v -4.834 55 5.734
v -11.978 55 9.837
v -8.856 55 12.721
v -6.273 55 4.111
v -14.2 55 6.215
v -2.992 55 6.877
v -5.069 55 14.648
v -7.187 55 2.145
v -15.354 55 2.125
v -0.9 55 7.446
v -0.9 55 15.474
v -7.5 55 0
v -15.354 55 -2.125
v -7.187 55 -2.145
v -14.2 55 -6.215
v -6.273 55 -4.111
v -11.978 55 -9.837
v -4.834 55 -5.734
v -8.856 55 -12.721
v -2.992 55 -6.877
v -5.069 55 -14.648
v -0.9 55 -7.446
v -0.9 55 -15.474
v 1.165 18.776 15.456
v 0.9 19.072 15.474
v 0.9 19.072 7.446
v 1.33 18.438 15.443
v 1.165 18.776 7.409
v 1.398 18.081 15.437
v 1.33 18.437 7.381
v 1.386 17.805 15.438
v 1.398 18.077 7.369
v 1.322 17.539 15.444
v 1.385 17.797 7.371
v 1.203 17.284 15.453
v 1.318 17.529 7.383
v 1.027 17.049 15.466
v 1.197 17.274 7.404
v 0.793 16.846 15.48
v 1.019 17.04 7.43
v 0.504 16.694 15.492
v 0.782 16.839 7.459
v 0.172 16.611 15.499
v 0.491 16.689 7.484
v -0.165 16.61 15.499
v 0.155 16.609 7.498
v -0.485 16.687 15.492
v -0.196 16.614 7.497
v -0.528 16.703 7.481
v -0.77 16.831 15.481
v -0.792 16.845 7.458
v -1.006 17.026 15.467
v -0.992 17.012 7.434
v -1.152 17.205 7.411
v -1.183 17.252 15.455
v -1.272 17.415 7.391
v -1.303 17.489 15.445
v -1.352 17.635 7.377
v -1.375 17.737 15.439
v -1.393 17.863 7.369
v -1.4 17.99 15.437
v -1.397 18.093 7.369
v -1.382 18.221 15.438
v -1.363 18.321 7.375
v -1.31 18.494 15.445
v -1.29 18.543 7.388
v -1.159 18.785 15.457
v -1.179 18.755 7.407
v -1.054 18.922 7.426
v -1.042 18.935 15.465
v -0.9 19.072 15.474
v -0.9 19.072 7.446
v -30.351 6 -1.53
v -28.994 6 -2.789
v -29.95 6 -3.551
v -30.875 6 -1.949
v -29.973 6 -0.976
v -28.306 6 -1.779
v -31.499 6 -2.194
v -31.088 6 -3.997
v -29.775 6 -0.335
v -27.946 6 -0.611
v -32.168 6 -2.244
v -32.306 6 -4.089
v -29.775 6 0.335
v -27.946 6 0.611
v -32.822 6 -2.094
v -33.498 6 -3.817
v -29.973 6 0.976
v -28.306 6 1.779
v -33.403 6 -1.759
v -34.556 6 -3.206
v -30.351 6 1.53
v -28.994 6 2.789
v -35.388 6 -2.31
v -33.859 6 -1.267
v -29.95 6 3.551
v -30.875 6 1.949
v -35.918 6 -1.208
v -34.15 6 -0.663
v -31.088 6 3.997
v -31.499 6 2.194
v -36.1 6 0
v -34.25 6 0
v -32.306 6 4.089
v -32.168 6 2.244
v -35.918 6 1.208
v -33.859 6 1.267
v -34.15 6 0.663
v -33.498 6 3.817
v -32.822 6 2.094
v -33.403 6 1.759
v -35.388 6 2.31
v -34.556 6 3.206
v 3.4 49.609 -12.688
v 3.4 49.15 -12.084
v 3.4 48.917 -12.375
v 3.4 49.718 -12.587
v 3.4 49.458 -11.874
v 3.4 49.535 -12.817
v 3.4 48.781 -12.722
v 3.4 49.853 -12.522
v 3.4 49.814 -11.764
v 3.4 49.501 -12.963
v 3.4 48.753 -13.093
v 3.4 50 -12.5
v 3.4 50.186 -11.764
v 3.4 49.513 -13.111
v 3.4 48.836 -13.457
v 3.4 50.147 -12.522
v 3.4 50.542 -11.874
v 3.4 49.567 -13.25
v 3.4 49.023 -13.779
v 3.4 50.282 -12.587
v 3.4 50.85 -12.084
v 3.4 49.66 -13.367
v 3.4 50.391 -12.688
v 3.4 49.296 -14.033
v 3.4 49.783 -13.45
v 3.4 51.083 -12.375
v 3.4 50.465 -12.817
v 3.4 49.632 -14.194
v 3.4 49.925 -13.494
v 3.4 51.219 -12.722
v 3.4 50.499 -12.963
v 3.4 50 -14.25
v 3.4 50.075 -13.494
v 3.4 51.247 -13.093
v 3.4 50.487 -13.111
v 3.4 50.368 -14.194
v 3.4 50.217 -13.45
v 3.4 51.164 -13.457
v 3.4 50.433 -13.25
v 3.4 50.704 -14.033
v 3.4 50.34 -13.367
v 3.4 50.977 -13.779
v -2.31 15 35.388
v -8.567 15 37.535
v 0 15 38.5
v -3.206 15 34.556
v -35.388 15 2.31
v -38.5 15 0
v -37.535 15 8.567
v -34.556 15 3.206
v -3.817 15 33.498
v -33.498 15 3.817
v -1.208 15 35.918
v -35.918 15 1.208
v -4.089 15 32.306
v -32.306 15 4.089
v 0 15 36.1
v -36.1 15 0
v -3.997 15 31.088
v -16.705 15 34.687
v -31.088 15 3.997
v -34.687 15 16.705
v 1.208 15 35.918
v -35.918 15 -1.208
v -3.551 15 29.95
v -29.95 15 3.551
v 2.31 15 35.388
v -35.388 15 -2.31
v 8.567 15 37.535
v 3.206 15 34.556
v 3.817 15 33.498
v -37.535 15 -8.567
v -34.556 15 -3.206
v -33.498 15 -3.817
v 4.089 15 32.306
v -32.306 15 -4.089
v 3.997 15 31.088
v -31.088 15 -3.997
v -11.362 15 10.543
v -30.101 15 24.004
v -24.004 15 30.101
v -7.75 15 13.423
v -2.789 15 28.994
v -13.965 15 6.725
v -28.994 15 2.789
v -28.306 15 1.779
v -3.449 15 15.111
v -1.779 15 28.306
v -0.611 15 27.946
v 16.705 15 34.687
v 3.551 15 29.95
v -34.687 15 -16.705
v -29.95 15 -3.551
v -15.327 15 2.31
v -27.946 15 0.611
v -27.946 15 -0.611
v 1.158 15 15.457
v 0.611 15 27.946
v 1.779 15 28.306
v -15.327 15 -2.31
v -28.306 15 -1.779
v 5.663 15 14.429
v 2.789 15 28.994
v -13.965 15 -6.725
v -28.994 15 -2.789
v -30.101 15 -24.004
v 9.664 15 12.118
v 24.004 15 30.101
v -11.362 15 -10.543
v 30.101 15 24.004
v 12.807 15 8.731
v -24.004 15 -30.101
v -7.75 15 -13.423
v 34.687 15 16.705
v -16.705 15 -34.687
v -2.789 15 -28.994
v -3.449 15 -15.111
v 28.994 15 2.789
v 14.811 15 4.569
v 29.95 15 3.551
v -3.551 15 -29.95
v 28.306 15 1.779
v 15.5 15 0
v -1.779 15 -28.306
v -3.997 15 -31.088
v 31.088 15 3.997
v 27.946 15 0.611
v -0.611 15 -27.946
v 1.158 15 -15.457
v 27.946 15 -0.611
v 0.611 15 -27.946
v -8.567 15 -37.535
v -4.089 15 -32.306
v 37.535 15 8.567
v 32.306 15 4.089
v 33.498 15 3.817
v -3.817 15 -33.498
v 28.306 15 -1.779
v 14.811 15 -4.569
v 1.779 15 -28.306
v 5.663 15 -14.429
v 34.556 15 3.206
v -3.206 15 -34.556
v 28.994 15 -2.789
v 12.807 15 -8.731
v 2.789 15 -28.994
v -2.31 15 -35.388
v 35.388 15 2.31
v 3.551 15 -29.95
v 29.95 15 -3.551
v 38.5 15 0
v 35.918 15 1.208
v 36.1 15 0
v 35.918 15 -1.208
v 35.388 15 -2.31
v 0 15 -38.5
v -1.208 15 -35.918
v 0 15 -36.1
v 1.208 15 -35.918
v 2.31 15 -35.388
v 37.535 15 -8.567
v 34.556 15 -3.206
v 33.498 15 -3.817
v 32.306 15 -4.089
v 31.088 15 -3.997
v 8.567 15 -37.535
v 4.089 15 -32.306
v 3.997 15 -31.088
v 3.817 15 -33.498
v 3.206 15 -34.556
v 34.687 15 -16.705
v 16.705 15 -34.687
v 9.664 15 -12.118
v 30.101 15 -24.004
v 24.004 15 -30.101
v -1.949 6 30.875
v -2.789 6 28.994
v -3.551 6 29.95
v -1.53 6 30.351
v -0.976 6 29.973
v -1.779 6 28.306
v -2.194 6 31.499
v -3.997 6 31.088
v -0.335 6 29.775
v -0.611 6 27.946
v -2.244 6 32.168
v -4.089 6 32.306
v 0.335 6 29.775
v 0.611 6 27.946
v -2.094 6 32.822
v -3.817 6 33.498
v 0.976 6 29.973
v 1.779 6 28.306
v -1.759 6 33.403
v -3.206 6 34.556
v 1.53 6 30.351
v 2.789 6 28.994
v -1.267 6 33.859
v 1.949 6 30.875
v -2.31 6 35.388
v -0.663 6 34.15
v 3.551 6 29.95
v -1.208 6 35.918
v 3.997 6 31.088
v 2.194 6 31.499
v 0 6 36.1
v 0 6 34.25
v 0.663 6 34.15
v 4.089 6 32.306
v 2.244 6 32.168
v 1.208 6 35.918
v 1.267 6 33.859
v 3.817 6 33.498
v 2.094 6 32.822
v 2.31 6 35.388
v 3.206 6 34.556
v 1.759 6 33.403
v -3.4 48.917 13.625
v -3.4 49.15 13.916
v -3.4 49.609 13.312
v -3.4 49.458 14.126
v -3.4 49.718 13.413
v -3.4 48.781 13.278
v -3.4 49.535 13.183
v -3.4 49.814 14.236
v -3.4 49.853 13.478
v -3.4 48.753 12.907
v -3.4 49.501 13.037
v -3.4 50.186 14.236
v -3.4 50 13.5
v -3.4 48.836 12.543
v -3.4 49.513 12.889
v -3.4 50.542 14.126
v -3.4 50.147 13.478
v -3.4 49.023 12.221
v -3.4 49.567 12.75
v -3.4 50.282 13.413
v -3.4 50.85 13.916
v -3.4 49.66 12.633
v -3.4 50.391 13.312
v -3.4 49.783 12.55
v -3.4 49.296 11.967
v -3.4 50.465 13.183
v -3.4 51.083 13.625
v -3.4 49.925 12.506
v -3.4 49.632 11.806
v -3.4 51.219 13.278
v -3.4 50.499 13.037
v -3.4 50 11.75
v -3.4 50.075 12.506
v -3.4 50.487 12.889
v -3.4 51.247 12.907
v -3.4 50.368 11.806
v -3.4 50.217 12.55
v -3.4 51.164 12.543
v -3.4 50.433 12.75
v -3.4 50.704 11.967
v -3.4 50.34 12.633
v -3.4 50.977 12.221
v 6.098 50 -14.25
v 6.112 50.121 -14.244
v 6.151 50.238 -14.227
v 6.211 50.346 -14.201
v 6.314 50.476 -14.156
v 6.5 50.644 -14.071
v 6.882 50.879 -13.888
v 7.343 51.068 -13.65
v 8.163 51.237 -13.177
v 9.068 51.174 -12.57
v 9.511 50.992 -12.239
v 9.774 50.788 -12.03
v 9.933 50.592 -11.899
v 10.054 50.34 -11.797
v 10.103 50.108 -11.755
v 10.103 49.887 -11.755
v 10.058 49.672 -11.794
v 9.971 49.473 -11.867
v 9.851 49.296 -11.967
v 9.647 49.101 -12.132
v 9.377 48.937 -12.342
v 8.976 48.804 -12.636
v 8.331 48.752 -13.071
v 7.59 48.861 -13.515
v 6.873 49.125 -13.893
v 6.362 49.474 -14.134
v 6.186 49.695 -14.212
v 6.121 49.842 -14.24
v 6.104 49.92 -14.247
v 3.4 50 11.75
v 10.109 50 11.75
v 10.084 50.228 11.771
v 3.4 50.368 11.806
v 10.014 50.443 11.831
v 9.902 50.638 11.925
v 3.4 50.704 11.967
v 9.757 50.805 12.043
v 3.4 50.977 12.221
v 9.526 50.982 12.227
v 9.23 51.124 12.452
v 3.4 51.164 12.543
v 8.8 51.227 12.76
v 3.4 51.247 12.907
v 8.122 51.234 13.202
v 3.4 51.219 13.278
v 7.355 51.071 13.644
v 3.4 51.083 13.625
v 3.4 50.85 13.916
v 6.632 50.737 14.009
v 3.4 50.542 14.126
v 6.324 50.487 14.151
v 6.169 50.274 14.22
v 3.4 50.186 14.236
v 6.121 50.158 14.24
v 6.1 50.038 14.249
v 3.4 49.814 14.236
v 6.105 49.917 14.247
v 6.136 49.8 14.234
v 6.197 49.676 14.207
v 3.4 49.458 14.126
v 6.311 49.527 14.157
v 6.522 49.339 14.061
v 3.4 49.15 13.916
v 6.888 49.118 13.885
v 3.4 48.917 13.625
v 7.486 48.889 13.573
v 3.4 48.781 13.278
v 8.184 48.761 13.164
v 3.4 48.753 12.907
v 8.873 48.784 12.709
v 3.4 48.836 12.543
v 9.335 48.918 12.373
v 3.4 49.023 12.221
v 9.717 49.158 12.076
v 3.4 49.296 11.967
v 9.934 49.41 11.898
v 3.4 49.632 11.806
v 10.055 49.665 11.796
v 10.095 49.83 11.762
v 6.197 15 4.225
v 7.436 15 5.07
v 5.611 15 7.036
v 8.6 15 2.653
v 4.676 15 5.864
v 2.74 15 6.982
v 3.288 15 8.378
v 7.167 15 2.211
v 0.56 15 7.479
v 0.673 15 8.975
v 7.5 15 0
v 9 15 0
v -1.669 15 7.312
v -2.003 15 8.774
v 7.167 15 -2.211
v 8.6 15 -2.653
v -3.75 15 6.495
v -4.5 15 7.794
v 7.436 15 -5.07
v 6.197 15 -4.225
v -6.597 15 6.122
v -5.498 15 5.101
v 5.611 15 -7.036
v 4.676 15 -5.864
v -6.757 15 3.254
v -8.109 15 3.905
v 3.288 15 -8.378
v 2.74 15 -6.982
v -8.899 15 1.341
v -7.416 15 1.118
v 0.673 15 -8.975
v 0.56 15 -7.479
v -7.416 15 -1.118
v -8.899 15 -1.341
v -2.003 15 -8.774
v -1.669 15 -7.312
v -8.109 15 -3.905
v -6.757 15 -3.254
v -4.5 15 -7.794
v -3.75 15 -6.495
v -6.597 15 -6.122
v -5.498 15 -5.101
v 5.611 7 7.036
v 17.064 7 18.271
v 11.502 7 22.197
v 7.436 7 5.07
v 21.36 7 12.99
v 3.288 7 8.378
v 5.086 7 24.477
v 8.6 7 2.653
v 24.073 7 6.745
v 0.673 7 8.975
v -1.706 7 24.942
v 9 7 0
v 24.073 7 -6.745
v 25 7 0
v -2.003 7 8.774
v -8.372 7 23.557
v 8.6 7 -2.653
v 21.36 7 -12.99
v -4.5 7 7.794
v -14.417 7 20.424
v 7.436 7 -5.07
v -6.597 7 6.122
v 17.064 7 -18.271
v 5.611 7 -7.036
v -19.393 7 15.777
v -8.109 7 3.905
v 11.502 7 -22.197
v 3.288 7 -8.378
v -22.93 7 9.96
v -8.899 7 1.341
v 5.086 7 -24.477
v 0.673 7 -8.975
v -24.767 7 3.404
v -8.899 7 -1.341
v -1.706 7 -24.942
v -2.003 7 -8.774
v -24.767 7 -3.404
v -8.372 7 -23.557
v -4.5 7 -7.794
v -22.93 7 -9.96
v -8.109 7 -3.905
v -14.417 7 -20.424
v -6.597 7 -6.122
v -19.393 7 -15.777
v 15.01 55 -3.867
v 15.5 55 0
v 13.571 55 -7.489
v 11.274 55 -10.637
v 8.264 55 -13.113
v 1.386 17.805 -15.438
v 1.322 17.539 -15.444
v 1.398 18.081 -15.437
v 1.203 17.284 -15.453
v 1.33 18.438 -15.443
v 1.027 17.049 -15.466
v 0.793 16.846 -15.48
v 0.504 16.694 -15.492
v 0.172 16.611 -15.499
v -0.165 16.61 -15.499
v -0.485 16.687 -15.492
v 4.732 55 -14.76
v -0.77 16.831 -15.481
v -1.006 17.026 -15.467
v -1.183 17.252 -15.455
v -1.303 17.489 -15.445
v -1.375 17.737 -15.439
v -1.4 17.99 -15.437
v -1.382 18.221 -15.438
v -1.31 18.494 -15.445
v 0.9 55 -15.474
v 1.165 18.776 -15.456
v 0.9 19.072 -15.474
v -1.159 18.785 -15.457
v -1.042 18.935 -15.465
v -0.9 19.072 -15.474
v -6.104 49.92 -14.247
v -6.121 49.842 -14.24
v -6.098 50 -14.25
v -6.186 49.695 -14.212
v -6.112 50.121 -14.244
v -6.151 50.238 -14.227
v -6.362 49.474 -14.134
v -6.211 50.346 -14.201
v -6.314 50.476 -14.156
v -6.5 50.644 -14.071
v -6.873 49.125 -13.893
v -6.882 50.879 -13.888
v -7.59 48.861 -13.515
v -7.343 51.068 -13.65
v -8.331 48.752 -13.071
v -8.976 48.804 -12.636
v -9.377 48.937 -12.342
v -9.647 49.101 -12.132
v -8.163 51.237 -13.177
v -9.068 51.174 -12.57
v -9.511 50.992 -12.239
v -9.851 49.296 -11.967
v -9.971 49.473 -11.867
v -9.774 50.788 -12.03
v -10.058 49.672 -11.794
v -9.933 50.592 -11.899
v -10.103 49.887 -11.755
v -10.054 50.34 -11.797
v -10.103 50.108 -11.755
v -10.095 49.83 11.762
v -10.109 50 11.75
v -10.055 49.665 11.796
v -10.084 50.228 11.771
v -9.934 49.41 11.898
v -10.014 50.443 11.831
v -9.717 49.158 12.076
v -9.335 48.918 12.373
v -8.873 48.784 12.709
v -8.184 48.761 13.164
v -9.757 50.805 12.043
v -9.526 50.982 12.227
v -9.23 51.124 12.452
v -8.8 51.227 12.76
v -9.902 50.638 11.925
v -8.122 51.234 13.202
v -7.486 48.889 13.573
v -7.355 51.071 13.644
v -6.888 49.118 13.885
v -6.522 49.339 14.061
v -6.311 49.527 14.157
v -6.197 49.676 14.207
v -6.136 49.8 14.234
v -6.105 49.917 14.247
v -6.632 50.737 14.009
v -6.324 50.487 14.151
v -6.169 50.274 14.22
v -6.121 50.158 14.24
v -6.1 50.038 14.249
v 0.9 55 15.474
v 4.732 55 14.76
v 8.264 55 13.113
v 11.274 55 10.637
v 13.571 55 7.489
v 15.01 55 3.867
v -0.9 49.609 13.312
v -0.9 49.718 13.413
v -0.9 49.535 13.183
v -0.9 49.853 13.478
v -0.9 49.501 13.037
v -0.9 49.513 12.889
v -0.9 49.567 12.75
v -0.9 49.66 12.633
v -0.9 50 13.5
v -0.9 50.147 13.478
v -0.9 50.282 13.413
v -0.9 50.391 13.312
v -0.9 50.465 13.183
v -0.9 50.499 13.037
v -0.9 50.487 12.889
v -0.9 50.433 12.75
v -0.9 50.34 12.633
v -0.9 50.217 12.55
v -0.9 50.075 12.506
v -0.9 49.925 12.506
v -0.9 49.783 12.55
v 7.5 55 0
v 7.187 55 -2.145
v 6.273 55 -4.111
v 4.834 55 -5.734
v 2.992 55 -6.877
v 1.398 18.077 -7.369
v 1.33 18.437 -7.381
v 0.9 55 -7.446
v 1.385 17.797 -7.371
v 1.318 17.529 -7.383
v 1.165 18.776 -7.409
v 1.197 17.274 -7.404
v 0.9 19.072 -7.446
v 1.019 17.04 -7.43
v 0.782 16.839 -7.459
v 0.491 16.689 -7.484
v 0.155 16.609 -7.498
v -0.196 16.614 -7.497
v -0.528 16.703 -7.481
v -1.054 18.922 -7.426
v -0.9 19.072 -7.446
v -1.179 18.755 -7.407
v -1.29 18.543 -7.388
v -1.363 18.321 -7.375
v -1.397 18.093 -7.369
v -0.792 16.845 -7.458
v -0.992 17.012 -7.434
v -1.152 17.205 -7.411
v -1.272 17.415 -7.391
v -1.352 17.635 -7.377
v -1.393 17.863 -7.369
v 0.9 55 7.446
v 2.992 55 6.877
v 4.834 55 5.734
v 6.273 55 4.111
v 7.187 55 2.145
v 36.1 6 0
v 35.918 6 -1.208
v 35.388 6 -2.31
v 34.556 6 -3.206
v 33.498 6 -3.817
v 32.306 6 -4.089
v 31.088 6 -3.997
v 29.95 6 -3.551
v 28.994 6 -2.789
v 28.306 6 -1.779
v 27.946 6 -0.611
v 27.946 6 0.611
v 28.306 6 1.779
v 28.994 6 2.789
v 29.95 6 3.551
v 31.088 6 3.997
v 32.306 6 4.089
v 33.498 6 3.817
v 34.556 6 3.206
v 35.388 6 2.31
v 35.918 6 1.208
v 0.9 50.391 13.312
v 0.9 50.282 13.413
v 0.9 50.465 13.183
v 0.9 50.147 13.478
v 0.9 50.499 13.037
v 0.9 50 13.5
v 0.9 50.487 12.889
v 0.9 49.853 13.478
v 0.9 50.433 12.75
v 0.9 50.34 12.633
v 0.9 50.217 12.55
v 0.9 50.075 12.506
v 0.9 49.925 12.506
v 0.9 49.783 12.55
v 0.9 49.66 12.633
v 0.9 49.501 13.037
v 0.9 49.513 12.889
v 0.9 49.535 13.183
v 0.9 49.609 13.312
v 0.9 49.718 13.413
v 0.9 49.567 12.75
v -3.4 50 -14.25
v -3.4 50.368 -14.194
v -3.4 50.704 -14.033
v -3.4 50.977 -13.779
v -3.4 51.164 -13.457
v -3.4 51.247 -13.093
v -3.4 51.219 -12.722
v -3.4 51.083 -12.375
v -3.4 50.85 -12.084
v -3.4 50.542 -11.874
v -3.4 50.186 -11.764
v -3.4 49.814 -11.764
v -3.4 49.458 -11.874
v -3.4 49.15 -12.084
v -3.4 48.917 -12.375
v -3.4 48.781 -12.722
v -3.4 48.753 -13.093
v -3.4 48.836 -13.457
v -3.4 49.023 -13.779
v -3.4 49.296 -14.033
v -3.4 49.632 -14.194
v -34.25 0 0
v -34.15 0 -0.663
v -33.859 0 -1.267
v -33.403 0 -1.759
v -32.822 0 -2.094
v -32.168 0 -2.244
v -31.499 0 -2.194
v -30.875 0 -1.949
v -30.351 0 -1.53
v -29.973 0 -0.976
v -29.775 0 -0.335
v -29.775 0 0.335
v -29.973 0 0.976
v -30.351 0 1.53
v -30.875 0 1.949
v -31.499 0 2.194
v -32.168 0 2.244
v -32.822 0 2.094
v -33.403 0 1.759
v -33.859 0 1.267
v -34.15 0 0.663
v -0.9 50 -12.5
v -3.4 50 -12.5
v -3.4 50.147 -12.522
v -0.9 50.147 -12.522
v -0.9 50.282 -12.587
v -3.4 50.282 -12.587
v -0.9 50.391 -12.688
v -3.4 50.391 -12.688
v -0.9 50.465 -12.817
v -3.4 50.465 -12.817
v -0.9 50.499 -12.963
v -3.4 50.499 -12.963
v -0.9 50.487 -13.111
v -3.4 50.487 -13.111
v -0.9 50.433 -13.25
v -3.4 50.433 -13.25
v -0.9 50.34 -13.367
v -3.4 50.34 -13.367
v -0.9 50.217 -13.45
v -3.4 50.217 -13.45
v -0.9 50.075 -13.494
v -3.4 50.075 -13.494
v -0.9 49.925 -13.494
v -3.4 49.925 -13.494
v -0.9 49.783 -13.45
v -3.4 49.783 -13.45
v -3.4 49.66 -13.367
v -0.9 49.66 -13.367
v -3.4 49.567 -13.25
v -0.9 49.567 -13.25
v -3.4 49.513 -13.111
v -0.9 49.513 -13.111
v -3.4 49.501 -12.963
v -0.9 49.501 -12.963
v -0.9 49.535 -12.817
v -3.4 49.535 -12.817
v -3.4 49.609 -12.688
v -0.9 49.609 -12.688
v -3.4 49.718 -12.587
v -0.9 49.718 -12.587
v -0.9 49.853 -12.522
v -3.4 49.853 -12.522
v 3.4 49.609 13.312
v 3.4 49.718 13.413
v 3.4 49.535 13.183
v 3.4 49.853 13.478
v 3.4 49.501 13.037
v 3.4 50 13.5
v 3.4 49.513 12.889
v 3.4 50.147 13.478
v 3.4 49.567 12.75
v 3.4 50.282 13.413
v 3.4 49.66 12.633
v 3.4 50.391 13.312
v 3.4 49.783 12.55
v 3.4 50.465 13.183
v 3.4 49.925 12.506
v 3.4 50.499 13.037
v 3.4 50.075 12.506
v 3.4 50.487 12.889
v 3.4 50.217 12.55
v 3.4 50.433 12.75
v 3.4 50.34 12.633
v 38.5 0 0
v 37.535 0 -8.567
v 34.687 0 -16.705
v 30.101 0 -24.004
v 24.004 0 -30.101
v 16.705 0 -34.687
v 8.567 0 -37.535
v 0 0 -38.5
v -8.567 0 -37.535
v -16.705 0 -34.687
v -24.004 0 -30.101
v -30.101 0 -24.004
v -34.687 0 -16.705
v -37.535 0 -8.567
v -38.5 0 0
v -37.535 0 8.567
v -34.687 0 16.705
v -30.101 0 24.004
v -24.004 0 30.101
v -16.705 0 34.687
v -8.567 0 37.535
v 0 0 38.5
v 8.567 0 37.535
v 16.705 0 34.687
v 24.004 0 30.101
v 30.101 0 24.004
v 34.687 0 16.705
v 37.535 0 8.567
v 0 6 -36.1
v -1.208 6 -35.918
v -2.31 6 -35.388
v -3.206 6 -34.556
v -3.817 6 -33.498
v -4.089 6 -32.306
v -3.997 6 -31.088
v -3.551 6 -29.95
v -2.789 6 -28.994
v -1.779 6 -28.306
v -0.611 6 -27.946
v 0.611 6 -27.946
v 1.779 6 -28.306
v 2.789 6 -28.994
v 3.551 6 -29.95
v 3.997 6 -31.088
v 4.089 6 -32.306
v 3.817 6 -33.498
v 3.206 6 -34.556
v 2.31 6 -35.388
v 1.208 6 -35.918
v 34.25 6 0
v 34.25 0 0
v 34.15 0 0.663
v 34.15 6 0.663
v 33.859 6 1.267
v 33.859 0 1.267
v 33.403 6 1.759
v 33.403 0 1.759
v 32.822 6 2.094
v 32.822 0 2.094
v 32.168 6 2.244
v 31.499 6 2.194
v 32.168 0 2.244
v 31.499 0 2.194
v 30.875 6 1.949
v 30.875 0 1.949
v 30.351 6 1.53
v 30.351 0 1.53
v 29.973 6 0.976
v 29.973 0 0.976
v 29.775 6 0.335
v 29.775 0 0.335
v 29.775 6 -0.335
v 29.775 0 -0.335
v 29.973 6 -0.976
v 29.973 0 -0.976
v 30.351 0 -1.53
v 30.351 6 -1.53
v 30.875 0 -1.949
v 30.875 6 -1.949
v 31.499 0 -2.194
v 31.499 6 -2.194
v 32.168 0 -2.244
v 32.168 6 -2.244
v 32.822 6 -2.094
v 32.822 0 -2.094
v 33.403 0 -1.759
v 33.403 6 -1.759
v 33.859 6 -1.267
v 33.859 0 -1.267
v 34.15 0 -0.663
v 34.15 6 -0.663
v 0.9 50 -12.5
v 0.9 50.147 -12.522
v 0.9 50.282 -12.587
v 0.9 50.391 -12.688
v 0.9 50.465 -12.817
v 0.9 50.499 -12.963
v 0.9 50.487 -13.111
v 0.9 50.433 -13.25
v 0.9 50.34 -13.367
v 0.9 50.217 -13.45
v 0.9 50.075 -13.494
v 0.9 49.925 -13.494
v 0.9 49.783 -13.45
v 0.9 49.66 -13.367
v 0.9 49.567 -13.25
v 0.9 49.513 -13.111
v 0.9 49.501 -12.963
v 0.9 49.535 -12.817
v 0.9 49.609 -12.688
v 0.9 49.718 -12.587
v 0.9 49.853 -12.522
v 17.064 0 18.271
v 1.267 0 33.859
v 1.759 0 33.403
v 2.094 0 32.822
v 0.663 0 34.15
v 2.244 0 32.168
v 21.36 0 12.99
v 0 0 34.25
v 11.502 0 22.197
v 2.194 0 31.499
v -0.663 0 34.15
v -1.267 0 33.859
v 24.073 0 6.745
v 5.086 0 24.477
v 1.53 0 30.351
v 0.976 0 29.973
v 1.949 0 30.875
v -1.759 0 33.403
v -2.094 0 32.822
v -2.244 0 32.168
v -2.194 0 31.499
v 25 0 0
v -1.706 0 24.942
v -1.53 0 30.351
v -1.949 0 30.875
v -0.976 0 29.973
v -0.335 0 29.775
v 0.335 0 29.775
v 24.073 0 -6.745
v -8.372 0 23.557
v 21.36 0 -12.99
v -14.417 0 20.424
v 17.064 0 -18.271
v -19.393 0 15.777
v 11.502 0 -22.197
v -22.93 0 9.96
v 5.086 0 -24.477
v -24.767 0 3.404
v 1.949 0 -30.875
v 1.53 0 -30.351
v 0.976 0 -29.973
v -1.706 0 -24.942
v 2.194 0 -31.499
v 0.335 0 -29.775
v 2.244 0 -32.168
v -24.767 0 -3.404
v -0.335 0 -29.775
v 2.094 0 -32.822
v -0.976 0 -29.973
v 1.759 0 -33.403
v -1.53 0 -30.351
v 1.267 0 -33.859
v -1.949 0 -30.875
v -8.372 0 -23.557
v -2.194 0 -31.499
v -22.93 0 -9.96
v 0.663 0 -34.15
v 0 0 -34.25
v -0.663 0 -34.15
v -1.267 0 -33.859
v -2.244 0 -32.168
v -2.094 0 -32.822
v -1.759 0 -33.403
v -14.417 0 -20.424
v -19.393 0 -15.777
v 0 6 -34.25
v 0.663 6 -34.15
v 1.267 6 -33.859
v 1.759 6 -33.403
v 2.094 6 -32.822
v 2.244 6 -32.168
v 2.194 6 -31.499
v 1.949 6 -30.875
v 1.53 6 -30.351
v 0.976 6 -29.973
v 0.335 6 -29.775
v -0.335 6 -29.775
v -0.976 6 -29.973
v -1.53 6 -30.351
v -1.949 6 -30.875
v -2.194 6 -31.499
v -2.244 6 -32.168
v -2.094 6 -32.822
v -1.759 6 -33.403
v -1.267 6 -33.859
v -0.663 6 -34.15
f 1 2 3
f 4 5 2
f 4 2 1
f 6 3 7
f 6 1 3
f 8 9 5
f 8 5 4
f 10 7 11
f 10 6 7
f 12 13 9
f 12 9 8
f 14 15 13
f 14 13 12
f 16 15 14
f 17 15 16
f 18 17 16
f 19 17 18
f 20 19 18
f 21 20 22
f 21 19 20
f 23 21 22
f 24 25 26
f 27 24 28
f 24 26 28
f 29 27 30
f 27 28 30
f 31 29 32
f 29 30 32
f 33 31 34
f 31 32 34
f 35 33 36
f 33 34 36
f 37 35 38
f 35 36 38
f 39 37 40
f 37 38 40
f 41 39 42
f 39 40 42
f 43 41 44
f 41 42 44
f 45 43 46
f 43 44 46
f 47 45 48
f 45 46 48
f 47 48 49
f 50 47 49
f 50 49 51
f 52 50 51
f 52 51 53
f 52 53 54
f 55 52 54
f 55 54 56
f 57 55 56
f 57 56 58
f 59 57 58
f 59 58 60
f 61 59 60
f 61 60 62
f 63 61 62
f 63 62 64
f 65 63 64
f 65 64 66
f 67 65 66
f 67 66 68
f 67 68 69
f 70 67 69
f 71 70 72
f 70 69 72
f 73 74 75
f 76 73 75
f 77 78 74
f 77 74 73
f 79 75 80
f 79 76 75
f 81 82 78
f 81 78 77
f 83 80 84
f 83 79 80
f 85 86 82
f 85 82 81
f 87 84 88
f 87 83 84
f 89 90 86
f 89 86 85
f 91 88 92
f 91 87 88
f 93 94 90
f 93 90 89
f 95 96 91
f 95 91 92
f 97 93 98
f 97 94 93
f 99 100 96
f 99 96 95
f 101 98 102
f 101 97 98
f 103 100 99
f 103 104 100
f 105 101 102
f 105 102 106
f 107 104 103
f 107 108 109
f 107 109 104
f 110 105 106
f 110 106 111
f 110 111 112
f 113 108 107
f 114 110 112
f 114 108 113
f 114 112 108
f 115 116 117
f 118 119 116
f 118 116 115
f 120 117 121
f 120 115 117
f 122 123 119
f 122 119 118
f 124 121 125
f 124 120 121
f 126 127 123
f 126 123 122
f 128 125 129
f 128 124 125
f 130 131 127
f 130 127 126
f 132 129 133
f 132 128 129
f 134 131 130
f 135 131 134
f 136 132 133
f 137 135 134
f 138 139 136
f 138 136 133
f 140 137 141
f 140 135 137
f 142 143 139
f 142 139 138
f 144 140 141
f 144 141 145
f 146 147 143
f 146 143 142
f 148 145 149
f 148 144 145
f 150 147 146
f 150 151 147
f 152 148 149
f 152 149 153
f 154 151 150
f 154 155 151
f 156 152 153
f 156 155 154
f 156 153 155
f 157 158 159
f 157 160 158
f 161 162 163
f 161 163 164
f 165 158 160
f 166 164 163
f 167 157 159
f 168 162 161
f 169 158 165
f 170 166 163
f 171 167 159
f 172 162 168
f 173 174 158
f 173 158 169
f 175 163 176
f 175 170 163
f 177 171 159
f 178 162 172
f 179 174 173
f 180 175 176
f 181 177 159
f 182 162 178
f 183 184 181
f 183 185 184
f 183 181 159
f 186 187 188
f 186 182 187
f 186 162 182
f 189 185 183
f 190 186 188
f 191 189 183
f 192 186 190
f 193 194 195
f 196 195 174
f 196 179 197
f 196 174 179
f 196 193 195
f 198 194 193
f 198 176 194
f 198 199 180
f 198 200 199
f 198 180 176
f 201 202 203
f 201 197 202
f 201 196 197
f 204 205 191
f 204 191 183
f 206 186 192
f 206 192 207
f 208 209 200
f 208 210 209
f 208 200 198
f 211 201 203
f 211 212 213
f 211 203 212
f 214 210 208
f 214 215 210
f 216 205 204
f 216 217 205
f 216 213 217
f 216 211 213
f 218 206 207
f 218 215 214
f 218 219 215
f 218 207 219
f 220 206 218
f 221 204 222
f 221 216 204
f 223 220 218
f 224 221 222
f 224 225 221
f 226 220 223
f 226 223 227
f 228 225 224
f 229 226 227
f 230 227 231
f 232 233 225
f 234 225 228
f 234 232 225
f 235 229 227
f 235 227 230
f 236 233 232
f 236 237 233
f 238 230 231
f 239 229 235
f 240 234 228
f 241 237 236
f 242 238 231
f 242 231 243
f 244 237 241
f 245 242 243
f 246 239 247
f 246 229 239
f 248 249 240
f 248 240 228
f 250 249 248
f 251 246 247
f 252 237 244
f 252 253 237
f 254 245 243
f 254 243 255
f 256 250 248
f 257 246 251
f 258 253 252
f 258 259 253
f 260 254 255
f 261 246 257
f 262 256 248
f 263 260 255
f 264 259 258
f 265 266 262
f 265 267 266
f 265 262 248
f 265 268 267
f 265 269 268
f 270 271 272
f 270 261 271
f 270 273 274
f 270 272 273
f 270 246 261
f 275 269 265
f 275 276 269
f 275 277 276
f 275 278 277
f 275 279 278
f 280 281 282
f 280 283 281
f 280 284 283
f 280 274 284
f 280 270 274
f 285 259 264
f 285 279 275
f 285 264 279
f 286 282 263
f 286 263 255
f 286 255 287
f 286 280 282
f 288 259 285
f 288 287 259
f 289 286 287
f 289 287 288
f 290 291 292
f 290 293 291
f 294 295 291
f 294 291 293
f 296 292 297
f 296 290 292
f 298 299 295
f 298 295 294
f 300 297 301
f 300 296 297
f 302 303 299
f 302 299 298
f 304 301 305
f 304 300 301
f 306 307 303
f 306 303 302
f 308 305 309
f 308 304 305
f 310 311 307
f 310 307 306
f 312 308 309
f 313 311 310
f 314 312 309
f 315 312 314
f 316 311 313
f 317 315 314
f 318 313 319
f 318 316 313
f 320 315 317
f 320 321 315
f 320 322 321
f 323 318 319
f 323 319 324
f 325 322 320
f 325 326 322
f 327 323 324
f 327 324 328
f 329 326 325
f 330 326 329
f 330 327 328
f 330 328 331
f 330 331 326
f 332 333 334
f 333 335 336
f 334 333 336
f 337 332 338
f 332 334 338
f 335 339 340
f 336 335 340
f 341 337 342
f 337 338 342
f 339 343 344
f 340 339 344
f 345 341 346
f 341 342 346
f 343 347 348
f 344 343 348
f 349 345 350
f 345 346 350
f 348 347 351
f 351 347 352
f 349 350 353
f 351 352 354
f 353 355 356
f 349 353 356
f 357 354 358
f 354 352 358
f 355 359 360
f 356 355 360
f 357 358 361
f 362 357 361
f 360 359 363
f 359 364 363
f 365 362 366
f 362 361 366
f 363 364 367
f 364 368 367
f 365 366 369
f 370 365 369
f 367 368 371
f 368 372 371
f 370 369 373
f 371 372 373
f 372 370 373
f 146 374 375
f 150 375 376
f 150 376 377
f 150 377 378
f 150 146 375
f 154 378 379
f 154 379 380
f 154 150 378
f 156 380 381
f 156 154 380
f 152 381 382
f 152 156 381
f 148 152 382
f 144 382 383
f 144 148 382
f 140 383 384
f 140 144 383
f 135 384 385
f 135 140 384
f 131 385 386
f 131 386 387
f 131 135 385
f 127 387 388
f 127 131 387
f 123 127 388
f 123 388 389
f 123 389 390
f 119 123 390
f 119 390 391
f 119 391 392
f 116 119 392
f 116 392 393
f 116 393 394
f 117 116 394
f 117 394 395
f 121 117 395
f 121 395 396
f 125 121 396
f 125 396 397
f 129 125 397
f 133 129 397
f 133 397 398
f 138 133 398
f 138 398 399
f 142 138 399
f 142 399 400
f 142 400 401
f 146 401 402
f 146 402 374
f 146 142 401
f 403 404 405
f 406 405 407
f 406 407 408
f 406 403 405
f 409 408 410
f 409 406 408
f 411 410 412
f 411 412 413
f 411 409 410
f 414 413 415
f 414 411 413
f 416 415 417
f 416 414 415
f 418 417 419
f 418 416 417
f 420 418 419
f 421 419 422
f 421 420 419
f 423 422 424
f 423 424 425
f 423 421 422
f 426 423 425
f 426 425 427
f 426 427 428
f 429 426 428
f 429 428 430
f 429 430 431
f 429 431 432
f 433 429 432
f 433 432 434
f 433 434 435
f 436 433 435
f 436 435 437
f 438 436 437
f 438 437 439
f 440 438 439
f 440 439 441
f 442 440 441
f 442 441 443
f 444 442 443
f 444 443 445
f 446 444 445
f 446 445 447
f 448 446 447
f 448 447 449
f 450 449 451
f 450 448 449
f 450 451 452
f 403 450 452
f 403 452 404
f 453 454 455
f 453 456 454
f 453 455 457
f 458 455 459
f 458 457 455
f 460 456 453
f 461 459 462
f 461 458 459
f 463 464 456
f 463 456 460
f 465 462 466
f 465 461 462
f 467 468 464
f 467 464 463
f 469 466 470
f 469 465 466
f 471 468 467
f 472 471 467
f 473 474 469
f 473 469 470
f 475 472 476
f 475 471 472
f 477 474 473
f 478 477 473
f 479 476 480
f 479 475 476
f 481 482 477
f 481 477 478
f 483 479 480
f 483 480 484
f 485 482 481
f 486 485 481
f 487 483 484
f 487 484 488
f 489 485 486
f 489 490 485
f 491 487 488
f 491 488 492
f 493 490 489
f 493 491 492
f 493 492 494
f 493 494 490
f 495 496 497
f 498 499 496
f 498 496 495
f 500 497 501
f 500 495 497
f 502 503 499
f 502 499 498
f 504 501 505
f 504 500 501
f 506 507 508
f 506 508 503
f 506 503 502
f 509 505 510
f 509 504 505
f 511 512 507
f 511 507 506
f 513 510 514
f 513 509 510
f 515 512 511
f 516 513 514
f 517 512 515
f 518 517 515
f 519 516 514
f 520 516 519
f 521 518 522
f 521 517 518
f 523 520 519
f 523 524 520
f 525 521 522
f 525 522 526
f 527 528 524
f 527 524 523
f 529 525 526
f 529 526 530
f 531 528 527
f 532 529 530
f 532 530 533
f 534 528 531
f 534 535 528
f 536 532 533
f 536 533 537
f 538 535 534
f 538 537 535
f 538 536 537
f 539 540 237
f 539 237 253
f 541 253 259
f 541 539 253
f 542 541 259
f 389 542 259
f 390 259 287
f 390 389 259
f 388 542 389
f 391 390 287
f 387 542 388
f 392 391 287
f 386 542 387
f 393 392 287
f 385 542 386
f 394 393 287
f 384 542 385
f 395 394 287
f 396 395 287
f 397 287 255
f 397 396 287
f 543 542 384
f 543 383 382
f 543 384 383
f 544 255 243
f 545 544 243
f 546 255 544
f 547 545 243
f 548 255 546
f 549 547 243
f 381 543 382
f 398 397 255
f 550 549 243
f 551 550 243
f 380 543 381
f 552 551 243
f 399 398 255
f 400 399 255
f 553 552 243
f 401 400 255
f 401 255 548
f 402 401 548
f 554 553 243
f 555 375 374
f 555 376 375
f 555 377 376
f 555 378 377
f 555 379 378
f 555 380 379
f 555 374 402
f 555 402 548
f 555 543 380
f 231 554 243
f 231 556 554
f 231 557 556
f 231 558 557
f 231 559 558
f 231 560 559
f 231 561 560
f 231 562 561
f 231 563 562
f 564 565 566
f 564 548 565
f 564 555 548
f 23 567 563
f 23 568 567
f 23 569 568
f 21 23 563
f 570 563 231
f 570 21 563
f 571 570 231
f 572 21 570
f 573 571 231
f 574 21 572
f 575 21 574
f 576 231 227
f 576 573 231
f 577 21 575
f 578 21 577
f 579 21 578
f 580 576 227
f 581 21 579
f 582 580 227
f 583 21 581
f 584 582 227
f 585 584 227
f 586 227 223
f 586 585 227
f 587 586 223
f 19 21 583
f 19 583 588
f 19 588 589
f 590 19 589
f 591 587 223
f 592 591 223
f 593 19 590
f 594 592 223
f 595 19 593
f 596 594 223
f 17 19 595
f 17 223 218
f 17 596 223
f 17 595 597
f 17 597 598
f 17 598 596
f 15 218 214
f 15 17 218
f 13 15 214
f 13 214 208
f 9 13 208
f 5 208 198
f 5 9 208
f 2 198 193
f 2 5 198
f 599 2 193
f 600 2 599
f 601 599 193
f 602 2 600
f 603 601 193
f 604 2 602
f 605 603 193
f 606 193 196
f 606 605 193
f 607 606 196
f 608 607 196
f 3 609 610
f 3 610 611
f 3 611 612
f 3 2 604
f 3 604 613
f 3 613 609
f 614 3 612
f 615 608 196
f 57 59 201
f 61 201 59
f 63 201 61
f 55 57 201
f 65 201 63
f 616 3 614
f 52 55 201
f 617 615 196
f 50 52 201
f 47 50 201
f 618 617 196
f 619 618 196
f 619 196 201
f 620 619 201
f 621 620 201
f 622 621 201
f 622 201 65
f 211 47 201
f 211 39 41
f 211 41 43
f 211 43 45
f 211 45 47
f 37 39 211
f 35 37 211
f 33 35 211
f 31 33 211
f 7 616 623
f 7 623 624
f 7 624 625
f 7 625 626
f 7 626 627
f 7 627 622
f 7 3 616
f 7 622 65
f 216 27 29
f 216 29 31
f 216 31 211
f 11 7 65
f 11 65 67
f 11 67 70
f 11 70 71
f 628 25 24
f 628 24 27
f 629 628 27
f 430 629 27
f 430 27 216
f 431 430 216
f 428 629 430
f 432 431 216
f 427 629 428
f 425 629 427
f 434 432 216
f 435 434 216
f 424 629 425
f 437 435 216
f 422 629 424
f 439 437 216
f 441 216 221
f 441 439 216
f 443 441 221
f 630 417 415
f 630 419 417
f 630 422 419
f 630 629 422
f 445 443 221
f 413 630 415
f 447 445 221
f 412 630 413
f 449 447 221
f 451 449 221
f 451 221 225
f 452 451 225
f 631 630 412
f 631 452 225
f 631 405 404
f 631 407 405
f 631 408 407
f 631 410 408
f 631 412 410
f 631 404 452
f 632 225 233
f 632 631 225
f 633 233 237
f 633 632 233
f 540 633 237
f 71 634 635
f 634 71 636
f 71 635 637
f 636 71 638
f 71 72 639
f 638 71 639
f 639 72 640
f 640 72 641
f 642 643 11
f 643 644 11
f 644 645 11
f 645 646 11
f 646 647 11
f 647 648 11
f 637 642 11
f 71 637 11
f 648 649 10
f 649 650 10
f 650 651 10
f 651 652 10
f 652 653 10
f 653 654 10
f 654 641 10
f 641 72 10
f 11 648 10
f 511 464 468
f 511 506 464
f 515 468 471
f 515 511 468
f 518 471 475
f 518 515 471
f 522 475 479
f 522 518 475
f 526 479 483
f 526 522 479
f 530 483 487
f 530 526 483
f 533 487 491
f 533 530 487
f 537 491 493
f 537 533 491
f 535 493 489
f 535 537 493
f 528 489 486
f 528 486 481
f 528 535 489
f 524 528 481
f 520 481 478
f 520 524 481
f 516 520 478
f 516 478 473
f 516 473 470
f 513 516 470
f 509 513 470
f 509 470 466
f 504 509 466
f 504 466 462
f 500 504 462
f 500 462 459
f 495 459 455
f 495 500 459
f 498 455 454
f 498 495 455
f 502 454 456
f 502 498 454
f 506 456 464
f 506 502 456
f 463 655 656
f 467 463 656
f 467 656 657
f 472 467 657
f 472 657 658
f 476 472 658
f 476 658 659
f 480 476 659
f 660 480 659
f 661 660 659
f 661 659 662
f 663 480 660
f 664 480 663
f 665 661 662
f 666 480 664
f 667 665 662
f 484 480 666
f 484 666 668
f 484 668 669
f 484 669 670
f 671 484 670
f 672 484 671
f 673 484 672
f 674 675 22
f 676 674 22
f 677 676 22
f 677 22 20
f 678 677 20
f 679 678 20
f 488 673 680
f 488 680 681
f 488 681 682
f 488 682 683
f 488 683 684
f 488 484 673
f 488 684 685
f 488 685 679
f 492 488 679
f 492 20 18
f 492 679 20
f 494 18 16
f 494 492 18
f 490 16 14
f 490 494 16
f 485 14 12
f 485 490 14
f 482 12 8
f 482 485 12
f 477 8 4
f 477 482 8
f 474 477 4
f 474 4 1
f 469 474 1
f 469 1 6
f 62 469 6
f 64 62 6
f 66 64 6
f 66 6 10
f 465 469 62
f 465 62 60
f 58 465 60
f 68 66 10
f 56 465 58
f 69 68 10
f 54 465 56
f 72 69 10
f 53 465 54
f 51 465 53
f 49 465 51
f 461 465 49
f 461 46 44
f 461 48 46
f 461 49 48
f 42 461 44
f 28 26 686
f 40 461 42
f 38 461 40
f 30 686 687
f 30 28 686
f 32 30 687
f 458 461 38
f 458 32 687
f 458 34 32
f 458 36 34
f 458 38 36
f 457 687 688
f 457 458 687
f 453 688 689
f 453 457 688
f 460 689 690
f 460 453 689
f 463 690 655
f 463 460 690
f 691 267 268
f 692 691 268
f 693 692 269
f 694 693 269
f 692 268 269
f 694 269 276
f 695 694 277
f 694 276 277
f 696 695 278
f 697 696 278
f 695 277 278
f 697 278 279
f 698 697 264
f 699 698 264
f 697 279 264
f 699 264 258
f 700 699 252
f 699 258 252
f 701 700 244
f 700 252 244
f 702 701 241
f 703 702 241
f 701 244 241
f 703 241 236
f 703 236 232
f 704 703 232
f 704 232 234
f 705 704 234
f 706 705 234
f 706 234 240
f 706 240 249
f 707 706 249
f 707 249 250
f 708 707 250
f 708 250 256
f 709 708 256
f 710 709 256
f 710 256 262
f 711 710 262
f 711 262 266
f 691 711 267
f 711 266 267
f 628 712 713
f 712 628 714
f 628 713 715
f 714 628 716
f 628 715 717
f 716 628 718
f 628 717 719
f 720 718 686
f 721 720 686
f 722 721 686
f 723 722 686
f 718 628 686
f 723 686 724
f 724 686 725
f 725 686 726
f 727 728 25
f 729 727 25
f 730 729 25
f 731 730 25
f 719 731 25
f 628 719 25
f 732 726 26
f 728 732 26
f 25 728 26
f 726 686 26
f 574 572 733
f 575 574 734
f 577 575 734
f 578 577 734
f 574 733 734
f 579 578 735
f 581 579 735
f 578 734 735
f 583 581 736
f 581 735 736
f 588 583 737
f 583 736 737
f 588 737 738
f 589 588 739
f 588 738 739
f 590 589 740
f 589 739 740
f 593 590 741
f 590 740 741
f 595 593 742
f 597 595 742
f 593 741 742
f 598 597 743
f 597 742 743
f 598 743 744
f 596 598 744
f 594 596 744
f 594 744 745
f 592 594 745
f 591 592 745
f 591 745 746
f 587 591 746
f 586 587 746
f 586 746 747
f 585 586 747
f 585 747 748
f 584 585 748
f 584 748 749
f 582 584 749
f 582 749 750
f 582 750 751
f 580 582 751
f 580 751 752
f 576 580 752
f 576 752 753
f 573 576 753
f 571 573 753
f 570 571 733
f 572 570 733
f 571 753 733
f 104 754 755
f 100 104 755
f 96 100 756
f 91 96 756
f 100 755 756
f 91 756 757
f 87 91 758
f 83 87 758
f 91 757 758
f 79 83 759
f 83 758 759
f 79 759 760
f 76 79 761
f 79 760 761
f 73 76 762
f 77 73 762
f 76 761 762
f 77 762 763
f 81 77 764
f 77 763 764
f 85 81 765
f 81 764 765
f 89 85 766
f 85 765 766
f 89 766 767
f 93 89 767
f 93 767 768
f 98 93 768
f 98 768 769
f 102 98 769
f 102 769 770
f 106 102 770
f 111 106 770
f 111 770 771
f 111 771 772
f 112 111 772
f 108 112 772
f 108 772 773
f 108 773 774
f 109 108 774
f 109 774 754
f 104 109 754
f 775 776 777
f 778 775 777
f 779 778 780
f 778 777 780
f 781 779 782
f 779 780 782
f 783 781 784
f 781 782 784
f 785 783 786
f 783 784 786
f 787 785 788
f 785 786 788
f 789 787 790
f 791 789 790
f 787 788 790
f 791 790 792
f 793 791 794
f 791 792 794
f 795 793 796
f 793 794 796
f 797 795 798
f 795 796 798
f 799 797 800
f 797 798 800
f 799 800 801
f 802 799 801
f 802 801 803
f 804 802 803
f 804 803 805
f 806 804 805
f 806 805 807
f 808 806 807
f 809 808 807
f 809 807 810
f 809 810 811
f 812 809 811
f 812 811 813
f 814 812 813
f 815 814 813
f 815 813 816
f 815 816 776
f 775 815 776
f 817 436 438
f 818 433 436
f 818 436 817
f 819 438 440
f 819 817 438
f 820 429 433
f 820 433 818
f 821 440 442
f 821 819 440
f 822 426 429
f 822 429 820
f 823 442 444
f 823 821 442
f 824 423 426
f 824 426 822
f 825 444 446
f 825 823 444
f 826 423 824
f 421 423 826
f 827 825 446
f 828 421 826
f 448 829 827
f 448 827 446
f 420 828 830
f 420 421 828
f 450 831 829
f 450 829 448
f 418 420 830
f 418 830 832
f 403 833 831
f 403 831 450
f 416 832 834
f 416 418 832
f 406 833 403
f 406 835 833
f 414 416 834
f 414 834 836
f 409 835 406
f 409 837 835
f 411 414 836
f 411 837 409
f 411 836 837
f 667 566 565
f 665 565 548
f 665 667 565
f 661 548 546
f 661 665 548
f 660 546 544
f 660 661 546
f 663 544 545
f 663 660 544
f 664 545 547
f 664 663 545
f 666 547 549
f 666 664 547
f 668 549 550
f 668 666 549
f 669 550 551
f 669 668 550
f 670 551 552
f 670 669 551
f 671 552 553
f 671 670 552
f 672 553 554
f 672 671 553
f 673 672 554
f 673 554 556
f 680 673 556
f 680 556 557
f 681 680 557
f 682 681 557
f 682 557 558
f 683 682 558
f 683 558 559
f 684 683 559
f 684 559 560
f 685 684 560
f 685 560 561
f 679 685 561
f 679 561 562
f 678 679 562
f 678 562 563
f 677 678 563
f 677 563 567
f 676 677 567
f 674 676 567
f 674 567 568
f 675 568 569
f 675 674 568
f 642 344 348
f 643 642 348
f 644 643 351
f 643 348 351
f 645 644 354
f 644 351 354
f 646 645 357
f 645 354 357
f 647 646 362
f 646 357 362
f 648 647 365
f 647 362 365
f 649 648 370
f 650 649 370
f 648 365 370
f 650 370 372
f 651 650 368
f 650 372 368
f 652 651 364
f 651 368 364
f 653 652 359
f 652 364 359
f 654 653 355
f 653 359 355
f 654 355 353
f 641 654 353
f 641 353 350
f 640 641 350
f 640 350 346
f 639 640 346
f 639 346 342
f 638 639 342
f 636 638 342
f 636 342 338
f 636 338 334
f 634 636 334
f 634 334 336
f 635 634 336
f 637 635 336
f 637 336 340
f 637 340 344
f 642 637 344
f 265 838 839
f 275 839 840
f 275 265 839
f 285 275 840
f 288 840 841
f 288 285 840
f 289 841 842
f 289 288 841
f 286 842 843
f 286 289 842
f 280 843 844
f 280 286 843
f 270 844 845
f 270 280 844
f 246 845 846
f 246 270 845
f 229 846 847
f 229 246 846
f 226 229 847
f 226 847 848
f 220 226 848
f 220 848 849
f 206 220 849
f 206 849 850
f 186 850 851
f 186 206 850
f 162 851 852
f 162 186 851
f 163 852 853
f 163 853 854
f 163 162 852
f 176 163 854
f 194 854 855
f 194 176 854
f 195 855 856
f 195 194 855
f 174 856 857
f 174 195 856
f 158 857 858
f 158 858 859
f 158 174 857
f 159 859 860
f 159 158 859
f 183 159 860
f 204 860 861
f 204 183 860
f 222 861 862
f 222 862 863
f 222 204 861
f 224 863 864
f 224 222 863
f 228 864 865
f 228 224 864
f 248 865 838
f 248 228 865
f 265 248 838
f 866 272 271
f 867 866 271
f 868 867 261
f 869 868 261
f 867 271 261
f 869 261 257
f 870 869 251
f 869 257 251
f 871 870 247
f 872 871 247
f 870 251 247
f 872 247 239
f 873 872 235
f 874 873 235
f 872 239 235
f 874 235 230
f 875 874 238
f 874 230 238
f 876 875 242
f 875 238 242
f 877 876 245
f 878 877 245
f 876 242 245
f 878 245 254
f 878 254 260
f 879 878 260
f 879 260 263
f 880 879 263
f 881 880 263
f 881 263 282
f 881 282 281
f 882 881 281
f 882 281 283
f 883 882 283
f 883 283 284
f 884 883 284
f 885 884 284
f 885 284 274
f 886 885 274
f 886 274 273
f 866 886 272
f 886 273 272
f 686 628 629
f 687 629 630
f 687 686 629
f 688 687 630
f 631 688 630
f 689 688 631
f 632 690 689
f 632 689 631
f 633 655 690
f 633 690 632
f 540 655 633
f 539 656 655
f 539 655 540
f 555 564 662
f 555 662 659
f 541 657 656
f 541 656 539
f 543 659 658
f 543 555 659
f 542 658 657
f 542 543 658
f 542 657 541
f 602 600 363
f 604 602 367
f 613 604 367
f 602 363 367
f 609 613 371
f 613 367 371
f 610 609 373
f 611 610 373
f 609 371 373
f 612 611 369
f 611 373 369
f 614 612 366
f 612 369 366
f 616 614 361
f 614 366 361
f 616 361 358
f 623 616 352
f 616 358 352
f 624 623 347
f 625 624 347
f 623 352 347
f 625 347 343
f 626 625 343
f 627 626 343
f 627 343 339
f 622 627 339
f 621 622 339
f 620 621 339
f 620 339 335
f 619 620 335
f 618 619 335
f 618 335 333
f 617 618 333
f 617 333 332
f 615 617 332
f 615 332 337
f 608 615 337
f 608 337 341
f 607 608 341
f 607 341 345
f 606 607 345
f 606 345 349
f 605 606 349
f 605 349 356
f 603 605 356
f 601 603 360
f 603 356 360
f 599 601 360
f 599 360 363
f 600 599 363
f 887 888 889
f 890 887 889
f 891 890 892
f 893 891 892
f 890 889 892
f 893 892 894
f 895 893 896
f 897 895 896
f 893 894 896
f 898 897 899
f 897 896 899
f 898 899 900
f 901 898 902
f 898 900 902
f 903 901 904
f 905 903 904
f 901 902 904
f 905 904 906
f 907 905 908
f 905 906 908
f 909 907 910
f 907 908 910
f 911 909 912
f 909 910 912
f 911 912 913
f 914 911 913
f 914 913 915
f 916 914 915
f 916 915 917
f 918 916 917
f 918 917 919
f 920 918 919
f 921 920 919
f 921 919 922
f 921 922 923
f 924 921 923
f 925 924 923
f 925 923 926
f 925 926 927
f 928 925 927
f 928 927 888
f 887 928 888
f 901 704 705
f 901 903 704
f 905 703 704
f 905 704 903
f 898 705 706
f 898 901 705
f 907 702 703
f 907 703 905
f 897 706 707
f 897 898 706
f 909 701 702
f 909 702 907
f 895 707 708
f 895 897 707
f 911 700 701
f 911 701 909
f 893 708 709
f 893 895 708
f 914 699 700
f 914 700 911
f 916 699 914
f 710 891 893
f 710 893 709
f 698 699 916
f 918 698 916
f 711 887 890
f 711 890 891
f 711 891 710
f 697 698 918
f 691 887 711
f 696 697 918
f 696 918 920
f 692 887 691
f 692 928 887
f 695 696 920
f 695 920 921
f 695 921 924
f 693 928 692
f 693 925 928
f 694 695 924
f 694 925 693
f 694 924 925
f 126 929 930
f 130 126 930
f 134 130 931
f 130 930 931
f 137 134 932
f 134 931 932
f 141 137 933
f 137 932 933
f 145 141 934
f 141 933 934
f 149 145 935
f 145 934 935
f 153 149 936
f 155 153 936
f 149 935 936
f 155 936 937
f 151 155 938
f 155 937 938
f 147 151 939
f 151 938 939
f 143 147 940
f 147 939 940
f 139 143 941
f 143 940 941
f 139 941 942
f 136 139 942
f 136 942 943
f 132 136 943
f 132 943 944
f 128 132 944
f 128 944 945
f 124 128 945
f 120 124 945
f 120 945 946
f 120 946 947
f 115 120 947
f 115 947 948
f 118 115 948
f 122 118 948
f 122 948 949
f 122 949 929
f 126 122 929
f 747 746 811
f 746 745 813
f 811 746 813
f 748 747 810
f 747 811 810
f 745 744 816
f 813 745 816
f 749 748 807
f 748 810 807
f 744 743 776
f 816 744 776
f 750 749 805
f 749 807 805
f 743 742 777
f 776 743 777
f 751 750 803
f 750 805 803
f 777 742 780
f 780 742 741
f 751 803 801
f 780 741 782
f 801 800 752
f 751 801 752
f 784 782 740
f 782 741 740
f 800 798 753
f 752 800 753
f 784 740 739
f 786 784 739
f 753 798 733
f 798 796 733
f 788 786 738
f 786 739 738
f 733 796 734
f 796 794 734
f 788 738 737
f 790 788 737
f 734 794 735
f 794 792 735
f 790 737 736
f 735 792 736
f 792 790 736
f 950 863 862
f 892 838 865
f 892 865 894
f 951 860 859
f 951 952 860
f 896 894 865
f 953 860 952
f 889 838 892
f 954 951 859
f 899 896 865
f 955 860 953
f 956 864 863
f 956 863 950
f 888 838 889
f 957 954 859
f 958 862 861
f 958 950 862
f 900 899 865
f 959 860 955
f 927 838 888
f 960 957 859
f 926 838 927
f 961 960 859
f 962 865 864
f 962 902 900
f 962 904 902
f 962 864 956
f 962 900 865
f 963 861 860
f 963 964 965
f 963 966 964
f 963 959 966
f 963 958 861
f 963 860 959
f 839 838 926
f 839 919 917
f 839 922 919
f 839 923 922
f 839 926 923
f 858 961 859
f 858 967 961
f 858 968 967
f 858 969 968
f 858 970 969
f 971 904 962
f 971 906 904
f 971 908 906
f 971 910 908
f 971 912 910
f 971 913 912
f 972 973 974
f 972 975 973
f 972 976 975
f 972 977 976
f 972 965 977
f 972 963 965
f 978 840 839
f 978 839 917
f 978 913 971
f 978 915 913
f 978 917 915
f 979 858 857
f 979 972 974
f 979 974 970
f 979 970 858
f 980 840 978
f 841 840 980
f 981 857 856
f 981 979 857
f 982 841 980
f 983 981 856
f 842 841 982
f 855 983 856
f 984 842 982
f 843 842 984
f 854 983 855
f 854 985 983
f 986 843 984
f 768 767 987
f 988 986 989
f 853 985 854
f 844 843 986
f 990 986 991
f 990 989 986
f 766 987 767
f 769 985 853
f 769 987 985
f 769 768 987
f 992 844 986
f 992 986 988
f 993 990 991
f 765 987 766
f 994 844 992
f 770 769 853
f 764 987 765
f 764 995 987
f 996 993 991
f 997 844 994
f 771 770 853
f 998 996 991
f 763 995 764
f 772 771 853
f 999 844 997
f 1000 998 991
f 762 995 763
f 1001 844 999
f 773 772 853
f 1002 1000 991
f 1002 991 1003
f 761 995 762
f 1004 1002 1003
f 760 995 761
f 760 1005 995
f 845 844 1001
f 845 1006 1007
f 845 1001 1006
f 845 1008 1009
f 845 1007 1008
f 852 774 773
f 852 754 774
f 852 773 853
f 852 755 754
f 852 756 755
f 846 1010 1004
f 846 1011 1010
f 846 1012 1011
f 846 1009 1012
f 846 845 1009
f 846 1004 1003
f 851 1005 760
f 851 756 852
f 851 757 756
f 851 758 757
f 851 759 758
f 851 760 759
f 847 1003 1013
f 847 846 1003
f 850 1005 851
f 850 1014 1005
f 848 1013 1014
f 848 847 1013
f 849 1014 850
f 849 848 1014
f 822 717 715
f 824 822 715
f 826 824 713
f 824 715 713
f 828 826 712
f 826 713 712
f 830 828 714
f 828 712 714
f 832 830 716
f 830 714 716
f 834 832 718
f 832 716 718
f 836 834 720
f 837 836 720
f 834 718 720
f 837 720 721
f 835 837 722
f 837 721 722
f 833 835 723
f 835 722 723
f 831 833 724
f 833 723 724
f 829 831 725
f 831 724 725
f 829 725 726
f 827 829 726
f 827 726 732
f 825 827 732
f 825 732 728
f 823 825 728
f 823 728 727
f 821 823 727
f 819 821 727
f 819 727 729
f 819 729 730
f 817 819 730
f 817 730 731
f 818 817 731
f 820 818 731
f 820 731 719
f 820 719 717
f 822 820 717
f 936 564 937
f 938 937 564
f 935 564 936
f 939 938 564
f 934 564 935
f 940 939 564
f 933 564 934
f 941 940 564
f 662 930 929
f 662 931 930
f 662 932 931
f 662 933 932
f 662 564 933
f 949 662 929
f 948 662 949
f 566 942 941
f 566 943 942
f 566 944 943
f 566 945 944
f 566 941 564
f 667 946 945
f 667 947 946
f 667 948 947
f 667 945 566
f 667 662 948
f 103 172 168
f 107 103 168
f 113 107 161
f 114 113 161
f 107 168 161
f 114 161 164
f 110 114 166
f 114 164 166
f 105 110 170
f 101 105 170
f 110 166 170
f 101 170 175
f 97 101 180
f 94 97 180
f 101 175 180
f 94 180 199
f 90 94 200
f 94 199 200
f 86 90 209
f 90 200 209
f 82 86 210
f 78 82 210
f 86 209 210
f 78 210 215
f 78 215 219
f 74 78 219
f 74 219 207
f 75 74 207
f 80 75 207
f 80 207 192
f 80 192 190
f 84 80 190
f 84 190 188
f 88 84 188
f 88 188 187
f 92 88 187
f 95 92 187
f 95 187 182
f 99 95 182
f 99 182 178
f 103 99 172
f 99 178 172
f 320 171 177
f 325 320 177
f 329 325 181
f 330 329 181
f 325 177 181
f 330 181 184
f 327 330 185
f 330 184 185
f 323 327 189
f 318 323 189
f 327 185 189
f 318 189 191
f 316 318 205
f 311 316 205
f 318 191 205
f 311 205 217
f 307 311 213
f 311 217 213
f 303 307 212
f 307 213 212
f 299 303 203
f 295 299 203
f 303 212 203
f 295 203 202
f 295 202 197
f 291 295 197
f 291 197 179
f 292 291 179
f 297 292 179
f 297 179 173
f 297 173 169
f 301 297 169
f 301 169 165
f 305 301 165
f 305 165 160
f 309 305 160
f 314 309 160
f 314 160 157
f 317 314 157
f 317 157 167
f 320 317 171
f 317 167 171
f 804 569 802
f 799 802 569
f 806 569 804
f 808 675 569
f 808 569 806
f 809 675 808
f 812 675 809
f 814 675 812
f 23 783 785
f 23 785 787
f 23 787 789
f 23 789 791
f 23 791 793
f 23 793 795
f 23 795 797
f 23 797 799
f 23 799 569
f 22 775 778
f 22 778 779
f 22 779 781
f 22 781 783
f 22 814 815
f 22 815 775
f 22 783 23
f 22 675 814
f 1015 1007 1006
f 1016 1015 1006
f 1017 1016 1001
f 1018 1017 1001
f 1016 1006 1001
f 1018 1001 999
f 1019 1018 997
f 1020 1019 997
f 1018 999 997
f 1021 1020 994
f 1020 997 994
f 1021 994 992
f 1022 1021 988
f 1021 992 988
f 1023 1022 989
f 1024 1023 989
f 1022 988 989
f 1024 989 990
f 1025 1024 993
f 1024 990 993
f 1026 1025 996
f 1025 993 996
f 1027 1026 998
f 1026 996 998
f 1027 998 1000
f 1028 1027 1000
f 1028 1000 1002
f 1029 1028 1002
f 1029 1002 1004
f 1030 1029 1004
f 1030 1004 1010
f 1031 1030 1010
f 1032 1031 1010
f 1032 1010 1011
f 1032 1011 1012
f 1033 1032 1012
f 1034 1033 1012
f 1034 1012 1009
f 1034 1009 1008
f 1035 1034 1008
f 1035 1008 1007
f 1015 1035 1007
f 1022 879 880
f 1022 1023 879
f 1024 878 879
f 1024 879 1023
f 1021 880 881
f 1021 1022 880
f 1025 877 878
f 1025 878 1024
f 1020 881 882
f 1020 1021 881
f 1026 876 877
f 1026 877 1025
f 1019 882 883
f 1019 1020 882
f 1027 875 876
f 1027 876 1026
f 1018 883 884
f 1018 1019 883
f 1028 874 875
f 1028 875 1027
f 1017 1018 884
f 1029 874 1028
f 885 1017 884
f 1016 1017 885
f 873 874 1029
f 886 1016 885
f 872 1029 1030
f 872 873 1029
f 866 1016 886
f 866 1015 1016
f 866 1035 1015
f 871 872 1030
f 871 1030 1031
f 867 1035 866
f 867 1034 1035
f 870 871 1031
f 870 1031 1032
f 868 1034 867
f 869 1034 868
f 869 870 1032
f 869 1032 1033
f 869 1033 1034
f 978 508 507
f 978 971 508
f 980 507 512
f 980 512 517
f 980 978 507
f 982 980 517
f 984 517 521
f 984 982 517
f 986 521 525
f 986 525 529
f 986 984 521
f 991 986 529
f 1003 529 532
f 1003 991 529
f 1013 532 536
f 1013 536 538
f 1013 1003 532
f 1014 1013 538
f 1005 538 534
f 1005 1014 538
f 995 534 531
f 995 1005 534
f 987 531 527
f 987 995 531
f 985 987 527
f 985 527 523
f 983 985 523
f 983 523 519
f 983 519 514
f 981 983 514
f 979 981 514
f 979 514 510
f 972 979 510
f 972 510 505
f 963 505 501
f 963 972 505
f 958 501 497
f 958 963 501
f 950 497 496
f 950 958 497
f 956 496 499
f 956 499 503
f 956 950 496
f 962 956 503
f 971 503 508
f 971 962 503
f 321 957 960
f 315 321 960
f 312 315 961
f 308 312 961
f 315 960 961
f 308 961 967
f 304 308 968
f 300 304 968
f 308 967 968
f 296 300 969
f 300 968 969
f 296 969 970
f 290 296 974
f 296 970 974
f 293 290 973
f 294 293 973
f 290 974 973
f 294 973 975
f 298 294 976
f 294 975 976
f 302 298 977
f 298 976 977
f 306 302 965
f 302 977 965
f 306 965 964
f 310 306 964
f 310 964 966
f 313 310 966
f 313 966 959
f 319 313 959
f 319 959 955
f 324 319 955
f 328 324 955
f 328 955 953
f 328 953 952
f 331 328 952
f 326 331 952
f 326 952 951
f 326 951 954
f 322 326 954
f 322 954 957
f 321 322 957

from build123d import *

# Parameters (mm, degrees)
CUT_EXTRUDE1_DEPTH      = 39.5
CUT_EXTRUDE1_DEPTH_BACK = 39.5
CUT_EXTRUDE2_START      = -2.5
SKETCH3_R               = 1.25
CUT_EXTRUDE2_DEPTH      = 36.1
SKETCH4_R               = 0.5
CUT_EXTRUDE3_DEPTH      = 42.9
SKETCH5_R               = 2.25
CUT_EXTRUDE4_DEPTH      = 56.0000001
SKETCH6_R               = 4.1
CUT_EXTRUDE5_DEPTH      = 9
CIRPATTERN1_COUNT       = 4


with BuildPart() as part:
    # Sketch1 → Revolve1 (revolve)
    with BuildSketch(Plane.XY):
        Polygon((7.5, 55), (7.5, 15), (9, 15), (9, 7), (25, 7), (25, 0), (38.5, 0), (38.5, 15), (15.5, 15), (15.5, 55), align=None)
    revolve(axis=Axis((0, 0, 0), (0, 1, 0)))

    # Sketch2 → Cut-Extrude1 (cut, two sides)
    with BuildSketch(Plane.XY) as cut_extrude1_sk:
        with BuildLine():
            Line((-0.9, 55), (0.9, 55))
            Line((0.9, 55), (0.9, 19.072380529))
            ThreePointArc((0.9, 19.072380529), (0, 16.6), (-0.9, 19.072380529))
            Line((-0.9, 19.072380529), (-0.9, 55))
        make_face()
    extrude(amount=CUT_EXTRUDE1_DEPTH, mode=Mode.SUBTRACT)
    extrude(cut_extrude1_sk.sketch, amount=-CUT_EXTRUDE1_DEPTH_BACK, mode=Mode.SUBTRACT)

    # Sketch3 → Cut-Extrude2 (cut, through all)
    with BuildSketch(Plane(origin=(-0.9, 0, 0), x_dir=(0, 0, -1), z_dir=(1, 0, 0)).offset(CUT_EXTRUDE2_START)):
        with Locations((-13, 50)):
            Circle(SKETCH3_R)
        with Locations((13, 50)):
            Circle(SKETCH3_R)
    cut_extrude2 = extrude(amount=-CUT_EXTRUDE2_DEPTH, mode=Mode.SUBTRACT)

    # Sketch4 → Cut-Extrude3 (cut, through all)
    with BuildSketch(Plane.ZY.offset(3.4)):
        with Locations((13, 50)):
            Circle(SKETCH4_R)
        with Locations((-13, 50)):
            Circle(SKETCH4_R)
    extrude(amount=-CUT_EXTRUDE3_DEPTH, mode=Mode.SUBTRACT)

    # Mirror1: Cut-Extrude2 across plane
    add(cut_extrude2.mirror(Plane(origin=(0, 0, 0), x_dir=(0, 0, 1), z_dir=(1, 0, 0))), mode=Mode.SUBTRACT)

    # Sketch5 → Cut-Extrude4 (cut, through all)
    with BuildSketch(Plane.XZ):
        with Locations((32, 0)):
            Circle(SKETCH5_R)
    cut_extrude4 = extrude(amount=-CUT_EXTRUDE4_DEPTH, mode=Mode.SUBTRACT)

    # Sketch6 → Cut-Extrude5 (cut)
    with BuildSketch(Plane(origin=(0, 15, 0), x_dir=(1, 0, 0), z_dir=(0, 1, 0))):
        with Locations((32, 0)):
            Circle(SKETCH6_R)
    cut_extrude5 = extrude(amount=-CUT_EXTRUDE5_DEPTH, mode=Mode.SUBTRACT)

    # CirPattern1: Cut-Extrude4, Cut-Extrude5 ×4 about axis
    cirpattern1_axis = Axis((0, 0, 0), (0, 1, 0))
    for i in range(1, CIRPATTERN1_COUNT):
        add(cut_extrude4.rotate(cirpattern1_axis, i * 360 / CIRPATTERN1_COUNT), mode=Mode.SUBTRACT)
        add(cut_extrude5.rotate(cirpattern1_axis, i * 360 / CIRPATTERN1_COUNT), mode=Mode.SUBTRACT)


solid = part.part
